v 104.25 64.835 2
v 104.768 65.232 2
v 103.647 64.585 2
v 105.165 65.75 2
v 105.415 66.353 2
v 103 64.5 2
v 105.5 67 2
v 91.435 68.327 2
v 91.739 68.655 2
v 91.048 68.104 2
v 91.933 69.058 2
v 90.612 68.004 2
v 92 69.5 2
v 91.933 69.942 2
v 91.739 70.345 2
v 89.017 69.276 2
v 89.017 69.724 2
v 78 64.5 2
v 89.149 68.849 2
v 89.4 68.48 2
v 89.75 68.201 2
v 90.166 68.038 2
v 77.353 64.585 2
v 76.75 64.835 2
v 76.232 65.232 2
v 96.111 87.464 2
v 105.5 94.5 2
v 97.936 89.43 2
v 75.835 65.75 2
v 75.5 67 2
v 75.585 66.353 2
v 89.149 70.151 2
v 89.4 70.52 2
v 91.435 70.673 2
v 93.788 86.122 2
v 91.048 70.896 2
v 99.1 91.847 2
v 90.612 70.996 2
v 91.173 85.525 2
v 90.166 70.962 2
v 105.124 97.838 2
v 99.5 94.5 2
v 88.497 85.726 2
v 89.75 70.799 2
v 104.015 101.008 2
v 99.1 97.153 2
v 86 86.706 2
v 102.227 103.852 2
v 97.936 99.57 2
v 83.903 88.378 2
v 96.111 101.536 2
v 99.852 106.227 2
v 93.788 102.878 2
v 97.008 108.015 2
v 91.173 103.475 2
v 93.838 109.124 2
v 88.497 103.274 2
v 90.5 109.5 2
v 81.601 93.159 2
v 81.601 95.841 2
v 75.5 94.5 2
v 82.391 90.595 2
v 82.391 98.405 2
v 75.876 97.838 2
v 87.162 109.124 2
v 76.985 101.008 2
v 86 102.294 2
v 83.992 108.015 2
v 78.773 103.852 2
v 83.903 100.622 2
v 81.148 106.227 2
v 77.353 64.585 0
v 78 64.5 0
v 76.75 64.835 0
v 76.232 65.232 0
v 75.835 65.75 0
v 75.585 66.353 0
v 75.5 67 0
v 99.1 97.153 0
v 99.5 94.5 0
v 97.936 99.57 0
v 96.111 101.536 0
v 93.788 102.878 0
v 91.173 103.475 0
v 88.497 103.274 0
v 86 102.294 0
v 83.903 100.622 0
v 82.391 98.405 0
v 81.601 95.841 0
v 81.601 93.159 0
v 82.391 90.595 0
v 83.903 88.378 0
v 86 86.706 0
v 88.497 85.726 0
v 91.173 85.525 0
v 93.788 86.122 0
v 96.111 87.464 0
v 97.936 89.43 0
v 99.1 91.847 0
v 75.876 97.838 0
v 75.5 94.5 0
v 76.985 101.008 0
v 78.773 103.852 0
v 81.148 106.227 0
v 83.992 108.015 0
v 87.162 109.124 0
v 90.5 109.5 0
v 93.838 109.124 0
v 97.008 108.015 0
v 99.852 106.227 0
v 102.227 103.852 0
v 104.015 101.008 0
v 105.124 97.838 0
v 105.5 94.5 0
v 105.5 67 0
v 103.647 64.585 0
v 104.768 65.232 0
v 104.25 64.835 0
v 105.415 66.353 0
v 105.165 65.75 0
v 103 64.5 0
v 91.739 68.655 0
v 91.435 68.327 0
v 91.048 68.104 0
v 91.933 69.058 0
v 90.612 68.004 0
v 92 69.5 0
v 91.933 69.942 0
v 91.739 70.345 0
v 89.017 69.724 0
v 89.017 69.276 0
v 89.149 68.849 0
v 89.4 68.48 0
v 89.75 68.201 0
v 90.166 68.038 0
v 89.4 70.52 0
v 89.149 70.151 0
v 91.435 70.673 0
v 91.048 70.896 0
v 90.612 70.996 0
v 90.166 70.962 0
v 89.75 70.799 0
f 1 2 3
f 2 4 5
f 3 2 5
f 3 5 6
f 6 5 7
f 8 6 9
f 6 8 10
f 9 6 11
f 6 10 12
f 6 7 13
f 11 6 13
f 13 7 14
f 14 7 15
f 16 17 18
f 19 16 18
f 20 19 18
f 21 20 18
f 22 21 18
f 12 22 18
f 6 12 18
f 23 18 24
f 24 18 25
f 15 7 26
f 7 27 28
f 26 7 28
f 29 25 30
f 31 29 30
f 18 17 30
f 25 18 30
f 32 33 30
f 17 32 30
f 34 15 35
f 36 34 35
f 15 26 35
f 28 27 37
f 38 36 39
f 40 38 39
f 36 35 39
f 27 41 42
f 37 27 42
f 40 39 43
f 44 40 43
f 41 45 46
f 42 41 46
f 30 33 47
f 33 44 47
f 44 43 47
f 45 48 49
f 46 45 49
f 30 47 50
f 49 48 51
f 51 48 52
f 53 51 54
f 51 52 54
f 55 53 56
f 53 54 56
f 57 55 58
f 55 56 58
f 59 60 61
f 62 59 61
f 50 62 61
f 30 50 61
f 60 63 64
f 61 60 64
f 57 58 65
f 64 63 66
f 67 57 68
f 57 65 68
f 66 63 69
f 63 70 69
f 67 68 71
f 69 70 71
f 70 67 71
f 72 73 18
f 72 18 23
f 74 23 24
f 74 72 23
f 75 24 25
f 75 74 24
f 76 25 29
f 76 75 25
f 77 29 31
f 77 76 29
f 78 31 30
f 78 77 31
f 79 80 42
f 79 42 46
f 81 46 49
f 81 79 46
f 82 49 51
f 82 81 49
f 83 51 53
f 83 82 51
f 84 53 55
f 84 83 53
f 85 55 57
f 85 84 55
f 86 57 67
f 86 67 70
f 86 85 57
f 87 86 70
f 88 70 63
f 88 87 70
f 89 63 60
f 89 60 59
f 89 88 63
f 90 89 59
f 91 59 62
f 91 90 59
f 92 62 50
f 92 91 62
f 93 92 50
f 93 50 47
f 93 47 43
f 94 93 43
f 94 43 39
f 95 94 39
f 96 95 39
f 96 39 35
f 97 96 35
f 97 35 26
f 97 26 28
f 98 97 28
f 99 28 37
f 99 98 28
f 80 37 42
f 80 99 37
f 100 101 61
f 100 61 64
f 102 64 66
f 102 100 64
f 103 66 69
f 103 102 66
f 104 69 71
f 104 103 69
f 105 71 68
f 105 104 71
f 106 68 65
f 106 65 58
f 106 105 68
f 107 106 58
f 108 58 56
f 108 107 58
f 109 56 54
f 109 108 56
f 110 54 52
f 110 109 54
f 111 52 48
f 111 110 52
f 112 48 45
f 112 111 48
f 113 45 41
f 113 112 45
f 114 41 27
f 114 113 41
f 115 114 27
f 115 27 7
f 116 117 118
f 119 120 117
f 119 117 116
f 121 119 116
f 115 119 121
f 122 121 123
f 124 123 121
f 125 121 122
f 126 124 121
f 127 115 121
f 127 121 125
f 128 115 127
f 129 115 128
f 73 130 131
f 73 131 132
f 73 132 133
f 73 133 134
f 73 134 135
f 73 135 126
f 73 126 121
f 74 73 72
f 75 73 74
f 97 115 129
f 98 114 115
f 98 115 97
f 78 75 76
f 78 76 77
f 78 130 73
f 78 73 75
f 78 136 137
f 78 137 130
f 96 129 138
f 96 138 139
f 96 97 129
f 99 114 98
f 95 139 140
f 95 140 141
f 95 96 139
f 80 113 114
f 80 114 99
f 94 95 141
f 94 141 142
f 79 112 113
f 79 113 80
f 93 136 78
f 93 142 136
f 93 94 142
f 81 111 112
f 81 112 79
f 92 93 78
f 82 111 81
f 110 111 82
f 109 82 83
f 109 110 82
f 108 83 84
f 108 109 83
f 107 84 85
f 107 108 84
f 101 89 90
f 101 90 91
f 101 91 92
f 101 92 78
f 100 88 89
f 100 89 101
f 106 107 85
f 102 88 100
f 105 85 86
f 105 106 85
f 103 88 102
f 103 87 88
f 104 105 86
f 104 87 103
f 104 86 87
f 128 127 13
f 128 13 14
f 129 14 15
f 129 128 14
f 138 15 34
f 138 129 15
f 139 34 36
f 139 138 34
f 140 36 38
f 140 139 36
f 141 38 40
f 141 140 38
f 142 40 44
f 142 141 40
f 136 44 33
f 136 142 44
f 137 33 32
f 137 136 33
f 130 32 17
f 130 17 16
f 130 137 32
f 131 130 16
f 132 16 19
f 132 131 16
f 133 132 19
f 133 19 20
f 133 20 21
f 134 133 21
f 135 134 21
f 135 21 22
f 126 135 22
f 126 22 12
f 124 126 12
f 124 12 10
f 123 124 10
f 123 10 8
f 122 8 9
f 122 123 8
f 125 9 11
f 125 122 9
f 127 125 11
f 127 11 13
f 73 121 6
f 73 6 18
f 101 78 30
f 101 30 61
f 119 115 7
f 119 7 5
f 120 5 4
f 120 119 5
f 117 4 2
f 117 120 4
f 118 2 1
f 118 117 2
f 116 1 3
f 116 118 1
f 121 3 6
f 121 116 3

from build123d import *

# Parameters (mm, degrees)
SKETCH3_R           = 8.99999978
SKETCH3_R_2         = 1.49999954
BOSS_EXTRUDE1_DEPTH = 2


with BuildPart() as part:
    # Sketch3 → Boss-Extrude1 (new body)
    with BuildSketch(Plane.XY):
        with BuildLine():
            Line((75.5000014, 79.49999848), (75.5000014, 94.49999896))
            ThreePointArc((75.5000014, 94.49999896), (90.50000188, 109.49999944), (105.50000236, 94.49999896))
            Line((105.50000236, 94.49999896), (105.50000236, 66.99999808))
            ThreePointArc((105.50000236, 66.99999808), (104.76776929, 65.23223107), (103.00000228, 64.499998))
            Line((103.00000228, 64.499998), (78.00000148, 64.499998))
            ThreePointArc((78.00000148, 64.499998), (76.23223447, 65.23223107), (75.5000014, 66.99999808))
            Line((75.5000014, 66.99999808), (75.5000014, 79.49999848))
        make_face()
        with Locations((90.50000188, 94.49999896)):
            Circle(SKETCH3_R, mode=Mode.SUBTRACT)
        with Locations((90.50000188, 69.49999816)):
            Circle(SKETCH3_R_2, mode=Mode.SUBTRACT)
    extrude(amount=BOSS_EXTRUDE1_DEPTH)


solid = part.part
